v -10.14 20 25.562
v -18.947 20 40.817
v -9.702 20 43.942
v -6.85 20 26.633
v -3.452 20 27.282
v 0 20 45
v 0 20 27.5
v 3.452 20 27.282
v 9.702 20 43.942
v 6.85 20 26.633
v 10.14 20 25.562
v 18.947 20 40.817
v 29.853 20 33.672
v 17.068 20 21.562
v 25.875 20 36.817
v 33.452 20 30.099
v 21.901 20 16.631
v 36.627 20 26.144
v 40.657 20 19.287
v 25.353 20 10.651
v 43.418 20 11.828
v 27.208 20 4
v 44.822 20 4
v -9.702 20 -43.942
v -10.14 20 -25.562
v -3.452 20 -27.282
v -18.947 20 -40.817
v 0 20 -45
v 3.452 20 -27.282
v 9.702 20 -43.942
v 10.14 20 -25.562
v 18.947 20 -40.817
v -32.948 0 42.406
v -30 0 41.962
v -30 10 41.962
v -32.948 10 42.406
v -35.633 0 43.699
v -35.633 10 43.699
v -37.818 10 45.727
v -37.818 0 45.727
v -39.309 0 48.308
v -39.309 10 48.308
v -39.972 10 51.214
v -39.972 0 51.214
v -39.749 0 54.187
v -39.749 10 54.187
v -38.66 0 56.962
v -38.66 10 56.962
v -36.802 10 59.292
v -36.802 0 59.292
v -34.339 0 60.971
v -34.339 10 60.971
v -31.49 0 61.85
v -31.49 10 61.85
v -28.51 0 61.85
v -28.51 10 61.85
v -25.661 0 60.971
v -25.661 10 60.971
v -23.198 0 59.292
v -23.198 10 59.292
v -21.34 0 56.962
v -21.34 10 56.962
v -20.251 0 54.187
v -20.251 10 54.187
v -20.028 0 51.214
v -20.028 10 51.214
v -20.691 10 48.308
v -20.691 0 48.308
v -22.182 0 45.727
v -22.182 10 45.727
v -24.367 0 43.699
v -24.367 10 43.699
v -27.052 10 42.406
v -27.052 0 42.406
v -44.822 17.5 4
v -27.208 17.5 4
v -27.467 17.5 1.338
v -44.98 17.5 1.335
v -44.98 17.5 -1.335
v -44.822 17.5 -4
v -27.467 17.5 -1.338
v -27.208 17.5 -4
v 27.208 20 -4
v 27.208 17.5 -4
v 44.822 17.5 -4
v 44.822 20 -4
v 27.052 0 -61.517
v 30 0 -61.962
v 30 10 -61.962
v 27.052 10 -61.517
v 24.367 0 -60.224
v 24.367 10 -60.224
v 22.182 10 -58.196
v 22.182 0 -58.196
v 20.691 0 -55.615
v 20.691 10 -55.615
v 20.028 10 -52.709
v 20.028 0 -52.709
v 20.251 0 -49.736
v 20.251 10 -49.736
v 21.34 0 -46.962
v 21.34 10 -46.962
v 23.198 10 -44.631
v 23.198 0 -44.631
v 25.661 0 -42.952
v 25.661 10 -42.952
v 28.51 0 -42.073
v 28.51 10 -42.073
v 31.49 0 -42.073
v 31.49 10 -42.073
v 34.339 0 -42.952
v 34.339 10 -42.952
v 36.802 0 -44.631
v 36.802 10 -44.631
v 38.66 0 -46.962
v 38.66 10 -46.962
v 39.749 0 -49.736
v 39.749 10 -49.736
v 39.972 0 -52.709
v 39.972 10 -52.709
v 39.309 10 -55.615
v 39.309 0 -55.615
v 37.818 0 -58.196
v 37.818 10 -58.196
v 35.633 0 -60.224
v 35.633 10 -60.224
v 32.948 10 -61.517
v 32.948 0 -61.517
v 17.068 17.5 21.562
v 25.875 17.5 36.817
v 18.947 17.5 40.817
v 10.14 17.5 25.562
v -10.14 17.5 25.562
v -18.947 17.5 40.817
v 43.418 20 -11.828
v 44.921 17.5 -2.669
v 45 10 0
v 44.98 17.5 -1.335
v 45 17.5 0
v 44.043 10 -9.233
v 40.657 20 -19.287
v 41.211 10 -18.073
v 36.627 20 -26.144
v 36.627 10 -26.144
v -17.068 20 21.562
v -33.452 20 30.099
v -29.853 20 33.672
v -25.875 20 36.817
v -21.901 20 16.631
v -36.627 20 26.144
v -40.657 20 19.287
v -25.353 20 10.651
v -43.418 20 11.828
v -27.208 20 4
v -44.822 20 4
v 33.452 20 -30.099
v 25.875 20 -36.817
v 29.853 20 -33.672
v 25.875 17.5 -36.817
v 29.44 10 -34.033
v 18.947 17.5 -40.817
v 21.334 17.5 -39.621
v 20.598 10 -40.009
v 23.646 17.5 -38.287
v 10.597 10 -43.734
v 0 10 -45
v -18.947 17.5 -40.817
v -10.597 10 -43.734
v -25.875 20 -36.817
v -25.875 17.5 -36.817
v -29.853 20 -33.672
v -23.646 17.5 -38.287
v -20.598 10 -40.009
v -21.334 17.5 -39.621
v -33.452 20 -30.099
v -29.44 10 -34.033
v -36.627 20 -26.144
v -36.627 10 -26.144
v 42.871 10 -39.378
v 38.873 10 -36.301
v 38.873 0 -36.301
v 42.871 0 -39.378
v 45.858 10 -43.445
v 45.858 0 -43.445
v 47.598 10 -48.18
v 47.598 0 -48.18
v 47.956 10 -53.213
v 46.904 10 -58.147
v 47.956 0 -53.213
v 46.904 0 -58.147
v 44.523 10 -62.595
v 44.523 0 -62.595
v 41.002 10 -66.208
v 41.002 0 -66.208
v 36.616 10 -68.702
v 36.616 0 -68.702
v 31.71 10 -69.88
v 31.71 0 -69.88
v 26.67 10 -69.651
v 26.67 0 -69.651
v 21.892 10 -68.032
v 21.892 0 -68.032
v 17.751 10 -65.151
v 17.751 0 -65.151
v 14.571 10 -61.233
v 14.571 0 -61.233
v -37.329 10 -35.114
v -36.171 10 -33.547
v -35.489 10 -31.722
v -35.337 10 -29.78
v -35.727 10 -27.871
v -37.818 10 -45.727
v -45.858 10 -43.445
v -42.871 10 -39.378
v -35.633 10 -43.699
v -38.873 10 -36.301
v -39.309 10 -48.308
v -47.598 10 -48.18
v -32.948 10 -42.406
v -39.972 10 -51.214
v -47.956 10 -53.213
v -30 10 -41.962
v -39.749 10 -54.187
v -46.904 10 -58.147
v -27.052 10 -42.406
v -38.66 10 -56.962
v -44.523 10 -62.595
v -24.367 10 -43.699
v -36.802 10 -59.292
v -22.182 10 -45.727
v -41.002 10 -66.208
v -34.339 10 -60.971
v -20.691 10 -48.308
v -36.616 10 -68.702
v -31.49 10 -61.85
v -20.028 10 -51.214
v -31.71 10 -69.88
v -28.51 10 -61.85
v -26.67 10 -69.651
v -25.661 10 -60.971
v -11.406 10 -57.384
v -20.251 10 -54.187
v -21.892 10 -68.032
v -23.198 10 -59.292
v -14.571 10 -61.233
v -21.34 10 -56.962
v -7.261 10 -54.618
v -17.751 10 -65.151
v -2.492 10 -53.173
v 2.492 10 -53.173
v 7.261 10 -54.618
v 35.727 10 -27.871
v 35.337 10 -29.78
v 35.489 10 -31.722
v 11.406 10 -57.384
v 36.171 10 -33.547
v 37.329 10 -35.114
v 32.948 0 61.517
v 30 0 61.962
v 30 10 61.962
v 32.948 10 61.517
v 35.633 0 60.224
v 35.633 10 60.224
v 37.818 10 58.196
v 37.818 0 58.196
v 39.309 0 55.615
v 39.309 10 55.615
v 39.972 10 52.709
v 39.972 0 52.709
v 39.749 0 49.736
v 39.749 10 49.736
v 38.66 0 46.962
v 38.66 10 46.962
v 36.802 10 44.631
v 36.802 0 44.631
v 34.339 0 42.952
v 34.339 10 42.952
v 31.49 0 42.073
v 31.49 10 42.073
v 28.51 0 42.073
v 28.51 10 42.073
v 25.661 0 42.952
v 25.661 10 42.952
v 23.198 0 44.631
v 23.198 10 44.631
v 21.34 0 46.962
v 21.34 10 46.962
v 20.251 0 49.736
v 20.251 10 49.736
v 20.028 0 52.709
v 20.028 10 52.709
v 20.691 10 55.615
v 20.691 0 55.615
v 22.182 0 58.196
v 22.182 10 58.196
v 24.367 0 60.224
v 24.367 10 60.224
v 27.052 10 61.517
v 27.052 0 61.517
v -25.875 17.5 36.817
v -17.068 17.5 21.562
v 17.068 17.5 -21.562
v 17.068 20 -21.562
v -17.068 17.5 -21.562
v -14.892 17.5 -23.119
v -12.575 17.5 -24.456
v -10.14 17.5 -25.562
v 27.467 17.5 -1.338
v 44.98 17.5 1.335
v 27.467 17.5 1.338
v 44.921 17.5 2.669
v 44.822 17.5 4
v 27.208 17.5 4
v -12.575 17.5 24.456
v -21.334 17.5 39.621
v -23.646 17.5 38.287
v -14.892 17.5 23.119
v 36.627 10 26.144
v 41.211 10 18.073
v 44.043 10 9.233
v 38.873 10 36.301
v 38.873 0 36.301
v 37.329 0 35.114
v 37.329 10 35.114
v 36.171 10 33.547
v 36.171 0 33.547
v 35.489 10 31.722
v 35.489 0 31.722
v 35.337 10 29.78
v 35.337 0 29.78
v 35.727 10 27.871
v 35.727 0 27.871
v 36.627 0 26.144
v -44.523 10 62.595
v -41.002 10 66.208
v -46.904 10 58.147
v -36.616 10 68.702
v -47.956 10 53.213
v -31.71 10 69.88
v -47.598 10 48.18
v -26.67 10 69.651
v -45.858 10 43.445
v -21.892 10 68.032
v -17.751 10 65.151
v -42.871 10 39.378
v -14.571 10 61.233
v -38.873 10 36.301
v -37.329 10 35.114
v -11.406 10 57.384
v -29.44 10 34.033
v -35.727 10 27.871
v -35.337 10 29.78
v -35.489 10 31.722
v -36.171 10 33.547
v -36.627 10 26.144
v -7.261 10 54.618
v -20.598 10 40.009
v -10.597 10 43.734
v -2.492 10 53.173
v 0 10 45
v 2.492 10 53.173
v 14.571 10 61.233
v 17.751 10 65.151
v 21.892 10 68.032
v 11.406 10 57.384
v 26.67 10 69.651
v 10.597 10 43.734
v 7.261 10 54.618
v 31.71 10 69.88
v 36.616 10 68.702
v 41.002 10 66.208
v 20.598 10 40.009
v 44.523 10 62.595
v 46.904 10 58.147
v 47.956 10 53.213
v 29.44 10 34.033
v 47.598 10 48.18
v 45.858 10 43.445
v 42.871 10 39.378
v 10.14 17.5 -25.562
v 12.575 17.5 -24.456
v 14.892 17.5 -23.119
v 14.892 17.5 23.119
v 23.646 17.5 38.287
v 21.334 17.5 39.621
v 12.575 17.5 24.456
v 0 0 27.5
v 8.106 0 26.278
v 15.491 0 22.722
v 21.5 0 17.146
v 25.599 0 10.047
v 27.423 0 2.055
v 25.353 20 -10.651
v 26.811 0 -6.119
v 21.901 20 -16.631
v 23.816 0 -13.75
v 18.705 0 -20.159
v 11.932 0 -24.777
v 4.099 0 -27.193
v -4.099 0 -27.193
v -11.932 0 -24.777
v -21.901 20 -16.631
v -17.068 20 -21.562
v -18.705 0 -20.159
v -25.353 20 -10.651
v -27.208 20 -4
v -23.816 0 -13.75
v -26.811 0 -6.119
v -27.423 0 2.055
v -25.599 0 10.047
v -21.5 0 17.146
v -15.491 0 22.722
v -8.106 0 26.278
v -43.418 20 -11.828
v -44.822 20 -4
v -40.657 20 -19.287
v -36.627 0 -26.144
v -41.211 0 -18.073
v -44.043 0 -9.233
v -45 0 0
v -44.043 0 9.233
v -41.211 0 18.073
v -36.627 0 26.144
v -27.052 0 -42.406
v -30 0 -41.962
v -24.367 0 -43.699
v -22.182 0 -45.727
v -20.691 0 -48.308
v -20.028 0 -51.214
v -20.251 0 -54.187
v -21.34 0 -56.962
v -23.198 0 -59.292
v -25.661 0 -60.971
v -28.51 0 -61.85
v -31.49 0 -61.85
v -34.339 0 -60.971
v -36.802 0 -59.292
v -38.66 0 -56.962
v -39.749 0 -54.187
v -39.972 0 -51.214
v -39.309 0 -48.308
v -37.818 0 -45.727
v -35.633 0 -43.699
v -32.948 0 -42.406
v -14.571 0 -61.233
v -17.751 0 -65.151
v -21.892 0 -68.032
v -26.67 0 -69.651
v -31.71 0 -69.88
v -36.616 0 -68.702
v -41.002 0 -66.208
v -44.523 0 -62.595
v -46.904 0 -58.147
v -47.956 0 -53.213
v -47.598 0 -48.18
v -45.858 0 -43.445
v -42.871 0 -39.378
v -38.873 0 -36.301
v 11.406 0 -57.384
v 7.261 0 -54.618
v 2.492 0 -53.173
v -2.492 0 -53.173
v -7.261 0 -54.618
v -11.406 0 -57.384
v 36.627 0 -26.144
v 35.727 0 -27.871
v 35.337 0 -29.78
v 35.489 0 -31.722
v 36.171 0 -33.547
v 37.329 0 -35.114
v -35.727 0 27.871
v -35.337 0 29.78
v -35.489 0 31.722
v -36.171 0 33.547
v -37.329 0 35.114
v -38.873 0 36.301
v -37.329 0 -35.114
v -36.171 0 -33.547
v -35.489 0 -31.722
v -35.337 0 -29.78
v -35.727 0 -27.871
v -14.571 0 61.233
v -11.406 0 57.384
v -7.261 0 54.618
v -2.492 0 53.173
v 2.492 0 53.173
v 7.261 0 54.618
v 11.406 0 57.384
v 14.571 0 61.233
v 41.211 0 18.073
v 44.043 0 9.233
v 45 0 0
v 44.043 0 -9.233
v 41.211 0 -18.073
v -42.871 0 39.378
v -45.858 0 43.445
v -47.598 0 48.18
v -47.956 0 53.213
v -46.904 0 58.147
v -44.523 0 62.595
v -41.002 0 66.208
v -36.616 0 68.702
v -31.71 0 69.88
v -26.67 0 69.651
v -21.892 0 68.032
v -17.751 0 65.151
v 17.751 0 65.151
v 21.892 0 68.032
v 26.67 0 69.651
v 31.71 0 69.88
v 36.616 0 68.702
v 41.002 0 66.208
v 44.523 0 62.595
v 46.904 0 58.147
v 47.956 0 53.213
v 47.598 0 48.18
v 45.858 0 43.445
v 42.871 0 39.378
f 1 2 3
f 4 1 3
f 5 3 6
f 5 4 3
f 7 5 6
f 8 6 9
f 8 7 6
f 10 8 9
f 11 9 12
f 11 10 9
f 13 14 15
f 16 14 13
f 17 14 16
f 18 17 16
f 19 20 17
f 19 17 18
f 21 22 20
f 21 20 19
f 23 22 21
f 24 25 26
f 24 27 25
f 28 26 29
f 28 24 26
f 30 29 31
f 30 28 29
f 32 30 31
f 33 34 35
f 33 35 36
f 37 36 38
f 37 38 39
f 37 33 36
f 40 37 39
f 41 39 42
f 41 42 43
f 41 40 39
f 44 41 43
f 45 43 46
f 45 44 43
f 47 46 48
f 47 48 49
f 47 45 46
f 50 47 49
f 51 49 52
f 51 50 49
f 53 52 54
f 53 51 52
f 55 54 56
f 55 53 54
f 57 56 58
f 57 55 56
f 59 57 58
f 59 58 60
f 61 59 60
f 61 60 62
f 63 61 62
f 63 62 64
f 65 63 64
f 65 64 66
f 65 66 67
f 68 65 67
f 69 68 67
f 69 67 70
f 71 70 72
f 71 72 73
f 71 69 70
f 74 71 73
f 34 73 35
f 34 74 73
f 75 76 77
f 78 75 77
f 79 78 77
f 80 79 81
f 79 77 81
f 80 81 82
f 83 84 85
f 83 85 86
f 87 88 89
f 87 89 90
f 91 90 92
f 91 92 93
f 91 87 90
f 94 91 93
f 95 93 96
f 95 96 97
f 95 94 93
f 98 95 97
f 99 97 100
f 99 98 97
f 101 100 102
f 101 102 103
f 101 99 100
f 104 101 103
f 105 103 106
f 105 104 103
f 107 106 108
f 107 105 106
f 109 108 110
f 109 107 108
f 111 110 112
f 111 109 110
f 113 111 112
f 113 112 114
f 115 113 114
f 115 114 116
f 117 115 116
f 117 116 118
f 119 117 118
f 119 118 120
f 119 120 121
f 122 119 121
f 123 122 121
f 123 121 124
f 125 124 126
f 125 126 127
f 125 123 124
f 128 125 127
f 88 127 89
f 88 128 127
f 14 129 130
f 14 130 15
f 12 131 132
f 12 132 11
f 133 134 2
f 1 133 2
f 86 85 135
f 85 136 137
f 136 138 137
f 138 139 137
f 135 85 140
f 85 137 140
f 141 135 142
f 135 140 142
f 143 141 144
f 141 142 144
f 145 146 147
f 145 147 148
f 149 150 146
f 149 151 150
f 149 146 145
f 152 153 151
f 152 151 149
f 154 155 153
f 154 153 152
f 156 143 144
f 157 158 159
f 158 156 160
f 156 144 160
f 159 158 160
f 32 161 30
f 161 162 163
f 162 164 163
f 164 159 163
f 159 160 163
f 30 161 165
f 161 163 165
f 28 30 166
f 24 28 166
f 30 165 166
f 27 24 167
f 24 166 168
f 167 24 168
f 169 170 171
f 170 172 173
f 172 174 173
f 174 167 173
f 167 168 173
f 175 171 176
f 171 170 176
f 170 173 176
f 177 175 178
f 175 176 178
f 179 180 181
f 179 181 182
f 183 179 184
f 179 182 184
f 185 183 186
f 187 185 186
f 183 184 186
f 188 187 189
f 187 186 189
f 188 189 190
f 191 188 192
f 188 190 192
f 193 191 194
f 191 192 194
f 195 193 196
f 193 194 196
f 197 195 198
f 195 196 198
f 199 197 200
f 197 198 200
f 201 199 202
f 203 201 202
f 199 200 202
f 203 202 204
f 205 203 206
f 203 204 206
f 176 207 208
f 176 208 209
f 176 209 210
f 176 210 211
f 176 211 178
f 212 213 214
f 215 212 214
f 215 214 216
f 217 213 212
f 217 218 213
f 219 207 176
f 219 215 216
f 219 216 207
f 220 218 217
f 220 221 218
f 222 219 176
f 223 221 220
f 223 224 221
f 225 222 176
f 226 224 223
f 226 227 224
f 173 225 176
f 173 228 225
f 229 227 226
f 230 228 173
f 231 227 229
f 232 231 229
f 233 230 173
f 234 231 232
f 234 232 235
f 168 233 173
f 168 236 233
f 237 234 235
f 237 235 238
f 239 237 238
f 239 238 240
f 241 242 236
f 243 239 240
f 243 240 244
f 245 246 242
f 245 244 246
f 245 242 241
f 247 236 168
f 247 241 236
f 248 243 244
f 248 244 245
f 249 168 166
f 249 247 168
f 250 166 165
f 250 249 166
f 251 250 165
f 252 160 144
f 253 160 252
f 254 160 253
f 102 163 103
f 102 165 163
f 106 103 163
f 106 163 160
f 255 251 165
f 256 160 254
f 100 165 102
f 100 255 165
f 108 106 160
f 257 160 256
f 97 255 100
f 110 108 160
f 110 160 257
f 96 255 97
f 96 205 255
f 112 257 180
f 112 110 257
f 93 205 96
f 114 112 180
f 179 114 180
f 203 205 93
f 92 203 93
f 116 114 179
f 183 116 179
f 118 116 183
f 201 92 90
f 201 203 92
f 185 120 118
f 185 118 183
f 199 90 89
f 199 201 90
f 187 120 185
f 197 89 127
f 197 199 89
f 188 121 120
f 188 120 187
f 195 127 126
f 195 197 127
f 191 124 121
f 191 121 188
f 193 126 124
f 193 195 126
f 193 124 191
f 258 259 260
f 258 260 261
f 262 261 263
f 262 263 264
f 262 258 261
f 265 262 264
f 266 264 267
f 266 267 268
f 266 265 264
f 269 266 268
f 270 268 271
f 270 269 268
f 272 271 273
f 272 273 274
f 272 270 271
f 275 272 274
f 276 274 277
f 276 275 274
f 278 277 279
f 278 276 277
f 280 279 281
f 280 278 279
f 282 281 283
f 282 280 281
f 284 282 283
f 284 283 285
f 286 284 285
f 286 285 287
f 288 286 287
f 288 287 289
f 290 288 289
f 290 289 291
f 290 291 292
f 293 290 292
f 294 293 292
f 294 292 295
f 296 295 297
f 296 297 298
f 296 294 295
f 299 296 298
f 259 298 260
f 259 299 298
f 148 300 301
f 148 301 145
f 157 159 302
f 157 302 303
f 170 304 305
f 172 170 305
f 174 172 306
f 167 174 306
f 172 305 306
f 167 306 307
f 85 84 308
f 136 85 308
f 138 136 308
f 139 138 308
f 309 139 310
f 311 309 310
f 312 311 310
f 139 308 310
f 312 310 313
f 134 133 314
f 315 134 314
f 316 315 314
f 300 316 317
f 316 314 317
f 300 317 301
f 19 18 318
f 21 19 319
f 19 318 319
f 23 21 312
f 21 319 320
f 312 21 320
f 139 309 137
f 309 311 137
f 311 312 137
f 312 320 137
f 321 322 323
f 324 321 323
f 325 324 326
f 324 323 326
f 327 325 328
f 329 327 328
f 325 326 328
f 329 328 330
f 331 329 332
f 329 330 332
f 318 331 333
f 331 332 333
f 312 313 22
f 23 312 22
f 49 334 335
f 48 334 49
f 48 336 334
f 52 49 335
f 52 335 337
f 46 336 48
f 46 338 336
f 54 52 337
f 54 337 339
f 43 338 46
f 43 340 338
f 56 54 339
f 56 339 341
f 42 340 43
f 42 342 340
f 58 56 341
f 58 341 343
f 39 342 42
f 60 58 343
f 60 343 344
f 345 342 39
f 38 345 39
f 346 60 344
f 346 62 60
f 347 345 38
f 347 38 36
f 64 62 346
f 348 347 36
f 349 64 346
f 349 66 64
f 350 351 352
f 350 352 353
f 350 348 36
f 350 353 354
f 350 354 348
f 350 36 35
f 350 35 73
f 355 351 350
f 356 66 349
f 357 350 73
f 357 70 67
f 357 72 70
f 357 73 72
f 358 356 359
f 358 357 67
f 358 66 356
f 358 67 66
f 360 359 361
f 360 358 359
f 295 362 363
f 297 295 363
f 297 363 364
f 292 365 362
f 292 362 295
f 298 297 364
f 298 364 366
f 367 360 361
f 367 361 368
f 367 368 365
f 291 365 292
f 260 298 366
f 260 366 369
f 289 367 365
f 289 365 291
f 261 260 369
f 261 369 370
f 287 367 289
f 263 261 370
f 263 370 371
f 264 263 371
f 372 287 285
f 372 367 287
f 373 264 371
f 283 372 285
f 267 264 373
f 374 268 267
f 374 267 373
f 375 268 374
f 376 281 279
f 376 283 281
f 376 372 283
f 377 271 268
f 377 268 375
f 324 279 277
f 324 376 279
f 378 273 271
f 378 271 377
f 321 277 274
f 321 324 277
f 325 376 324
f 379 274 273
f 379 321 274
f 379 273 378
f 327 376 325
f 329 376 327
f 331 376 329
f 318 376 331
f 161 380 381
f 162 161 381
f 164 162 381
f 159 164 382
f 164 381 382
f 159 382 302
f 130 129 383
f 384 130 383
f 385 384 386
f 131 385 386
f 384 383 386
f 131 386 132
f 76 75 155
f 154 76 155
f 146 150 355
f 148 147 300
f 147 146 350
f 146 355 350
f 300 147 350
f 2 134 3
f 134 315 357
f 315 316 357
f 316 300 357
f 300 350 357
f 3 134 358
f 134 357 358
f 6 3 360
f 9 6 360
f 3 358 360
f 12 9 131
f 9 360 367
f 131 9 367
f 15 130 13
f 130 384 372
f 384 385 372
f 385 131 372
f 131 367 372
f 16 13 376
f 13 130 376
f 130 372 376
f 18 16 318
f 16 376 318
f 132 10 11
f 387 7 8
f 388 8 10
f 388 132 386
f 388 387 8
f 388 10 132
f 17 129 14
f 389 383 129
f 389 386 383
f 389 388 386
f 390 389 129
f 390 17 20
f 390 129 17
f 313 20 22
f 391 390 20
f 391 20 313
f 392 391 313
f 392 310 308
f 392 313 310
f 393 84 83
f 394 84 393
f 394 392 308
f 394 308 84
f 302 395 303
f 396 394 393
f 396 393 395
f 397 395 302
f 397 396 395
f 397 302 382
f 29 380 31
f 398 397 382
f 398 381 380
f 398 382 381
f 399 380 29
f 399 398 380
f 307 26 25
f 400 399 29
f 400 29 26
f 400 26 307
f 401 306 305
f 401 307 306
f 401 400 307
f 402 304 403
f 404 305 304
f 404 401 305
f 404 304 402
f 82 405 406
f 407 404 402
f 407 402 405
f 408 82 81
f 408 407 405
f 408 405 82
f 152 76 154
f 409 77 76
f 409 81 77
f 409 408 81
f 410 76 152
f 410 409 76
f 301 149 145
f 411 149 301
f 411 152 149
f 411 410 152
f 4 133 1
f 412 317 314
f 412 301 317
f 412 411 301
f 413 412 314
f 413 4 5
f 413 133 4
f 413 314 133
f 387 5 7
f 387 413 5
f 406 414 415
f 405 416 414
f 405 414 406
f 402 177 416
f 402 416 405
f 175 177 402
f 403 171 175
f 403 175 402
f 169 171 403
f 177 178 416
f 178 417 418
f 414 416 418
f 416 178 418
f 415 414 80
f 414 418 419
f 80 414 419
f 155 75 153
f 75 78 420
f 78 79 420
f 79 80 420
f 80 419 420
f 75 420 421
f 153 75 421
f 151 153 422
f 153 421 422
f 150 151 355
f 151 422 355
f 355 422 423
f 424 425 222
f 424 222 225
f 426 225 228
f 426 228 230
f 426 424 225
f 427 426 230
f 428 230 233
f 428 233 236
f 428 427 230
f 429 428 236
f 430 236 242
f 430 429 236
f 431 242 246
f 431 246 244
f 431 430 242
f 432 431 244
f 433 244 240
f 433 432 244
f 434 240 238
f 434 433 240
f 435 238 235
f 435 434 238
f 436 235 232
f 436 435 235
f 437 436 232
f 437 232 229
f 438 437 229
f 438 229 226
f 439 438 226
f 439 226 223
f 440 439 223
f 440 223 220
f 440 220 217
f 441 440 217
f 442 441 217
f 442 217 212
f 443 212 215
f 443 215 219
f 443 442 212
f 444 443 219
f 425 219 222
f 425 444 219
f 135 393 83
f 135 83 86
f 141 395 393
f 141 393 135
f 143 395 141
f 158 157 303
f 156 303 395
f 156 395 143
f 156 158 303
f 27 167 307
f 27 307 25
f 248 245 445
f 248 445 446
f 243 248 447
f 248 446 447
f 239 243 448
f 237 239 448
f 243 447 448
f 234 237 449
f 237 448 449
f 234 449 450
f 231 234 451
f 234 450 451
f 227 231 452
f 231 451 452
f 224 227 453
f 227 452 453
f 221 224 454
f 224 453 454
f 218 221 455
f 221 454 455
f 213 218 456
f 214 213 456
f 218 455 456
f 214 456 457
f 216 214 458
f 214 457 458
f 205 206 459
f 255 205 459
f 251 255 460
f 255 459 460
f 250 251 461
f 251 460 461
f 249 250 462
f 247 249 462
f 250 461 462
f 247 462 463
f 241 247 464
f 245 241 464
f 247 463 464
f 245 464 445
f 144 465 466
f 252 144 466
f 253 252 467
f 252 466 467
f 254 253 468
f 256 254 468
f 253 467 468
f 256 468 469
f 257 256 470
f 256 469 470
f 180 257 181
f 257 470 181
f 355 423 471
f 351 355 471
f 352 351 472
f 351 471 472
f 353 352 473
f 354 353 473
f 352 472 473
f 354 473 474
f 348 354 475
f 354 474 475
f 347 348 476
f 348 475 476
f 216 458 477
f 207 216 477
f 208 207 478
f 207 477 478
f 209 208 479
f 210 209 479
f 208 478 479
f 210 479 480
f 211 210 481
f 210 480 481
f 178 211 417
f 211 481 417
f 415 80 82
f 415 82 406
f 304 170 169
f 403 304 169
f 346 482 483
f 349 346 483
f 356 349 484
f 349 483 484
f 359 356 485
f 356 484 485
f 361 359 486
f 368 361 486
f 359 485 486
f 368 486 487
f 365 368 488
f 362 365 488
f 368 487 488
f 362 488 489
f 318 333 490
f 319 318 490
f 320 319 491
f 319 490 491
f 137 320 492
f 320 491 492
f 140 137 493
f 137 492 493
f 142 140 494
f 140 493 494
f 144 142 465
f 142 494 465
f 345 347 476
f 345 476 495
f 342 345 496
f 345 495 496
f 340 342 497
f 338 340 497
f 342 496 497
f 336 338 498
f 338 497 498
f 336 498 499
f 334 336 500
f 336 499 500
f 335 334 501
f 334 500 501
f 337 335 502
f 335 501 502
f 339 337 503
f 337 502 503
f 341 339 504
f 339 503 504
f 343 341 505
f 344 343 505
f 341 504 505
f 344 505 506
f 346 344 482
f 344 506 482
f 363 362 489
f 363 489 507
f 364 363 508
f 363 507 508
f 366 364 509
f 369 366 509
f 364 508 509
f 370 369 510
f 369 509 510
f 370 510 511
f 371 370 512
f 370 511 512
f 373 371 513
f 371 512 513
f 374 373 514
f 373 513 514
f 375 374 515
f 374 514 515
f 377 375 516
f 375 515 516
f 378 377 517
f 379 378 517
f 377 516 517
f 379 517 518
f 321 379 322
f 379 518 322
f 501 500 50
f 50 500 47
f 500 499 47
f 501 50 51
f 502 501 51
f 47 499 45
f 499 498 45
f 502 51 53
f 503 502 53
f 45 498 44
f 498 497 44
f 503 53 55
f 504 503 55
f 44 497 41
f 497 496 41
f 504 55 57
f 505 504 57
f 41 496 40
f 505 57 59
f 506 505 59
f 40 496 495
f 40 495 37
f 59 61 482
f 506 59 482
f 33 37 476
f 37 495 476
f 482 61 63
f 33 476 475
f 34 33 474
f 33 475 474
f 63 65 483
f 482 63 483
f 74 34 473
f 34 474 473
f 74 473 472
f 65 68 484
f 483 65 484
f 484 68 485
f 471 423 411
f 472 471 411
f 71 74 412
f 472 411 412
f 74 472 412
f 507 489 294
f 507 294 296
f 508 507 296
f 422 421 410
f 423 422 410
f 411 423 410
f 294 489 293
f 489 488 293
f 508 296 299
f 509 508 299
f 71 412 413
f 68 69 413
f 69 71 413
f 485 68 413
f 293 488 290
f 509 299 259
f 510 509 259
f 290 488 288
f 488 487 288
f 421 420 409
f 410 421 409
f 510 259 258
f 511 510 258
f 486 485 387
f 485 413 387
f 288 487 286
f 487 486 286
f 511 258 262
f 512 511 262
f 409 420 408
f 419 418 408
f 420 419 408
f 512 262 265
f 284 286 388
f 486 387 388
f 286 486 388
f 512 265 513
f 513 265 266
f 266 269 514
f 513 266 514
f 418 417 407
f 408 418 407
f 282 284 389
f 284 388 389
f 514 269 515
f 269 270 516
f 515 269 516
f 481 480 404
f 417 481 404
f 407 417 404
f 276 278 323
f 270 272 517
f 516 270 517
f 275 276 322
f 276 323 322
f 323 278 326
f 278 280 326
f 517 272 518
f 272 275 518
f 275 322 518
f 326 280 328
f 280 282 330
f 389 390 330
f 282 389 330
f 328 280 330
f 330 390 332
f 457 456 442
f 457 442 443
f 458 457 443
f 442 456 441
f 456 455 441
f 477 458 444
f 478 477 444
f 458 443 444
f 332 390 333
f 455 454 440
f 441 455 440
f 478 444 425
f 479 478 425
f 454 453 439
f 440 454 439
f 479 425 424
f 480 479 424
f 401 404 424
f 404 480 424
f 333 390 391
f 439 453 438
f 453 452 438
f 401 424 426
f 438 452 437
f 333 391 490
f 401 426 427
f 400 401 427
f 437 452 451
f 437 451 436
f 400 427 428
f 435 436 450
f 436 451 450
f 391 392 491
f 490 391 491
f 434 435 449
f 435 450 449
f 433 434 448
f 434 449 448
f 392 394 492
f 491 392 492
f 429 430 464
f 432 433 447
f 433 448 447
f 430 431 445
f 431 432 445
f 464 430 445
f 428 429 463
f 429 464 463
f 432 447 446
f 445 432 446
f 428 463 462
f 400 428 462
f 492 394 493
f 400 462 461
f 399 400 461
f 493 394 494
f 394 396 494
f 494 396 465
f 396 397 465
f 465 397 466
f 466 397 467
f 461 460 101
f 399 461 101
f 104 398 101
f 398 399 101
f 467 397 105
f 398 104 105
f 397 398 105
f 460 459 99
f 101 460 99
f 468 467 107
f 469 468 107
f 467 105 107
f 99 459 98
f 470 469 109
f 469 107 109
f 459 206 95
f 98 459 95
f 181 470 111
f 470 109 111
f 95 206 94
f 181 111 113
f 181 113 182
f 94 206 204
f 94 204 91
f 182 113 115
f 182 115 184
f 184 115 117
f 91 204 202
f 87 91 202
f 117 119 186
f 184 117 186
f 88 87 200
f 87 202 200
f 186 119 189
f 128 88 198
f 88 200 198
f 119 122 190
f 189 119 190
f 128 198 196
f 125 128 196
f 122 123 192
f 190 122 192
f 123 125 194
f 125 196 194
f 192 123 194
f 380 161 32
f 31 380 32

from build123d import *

# Parameters (mm, degrees)
SKETCH_1_R               = 27.5
SKETCH_1_R_2             = 10
EXTRUDE_1_DEPTH          = 10
SKETCH_2_R               = 27.5
EXTRUDE_2_DEPTH          = 10
SKETCH_3_W               = 8
SKETCH_3_H               = 2.5
CUT_EXTRUDE_2_DEPTH      = 108
PATTERN_CIRCULAR_2_COUNT = 6


with BuildPart() as part:
    # Эскиз1 → Бобышка-Вытянуть1 (new body)
    with BuildSketch(Plane(origin=(0, 0, 0), x_dir=(1, 0, 0), z_dir=(0, 1, 0))):
        with BuildLine():
            ThreePointArc((36.626693786, -26.14355183), (45, 0), (36.626693786, 26.14355183))
            ThreePointArc((36.626693786, 26.14355183), (35.489388485, 31.722157226), (38.87340923, 36.300661906))
            ThreePointArc((38.87340923, 36.300661906), (42.889809267, 64.52547333), (14.571428571, 61.232941793))
            ThreePointArc((14.571428571, 61.232941793), (0, 52.989280604), (-14.571428571, 61.232941793))
            ThreePointArc((-14.571428571, 61.232941793), (-42.889809267, 64.52547333), (-38.87340923, 36.300661906))
            ThreePointArc((-38.87340923, 36.300661906), (-35.489388485, 31.722157226), (-36.626693786, 26.14355183))
            ThreePointArc((-36.626693786, 26.14355183), (-45, 0), (-36.626693786, -26.14355183))
            ThreePointArc((-36.626693786, -26.14355183), (-35.489388485, -31.722157226), (-38.87340923, -36.300661906))
            ThreePointArc((-38.87340923, -36.300661906), (-42.889809267, -64.52547333), (-14.571428571, -61.232941793))
            ThreePointArc((-14.571428571, -61.232941793), (0, -52.989280604), (14.571428571, -61.232941793))
            ThreePointArc((14.571428571, -61.232941793), (42.889809267, -64.52547333), (38.87340923, -36.300661906))
            ThreePointArc((38.87340923, -36.300661906), (35.489388485, -31.722157226), (36.626693786, -26.14355183))
        make_face()
        Circle(SKETCH_1_R, mode=Mode.SUBTRACT)
        with Locations((30, -51.961524227)):
            Circle(SKETCH_1_R_2, mode=Mode.SUBTRACT)
        with Locations((-30, -51.961524227)):
            Circle(SKETCH_1_R_2, mode=Mode.SUBTRACT)
        with Locations((-30, 51.961524227)):
            Circle(SKETCH_1_R_2, mode=Mode.SUBTRACT)
        with Locations((30, 51.961524227)):
            Circle(SKETCH_1_R_2, mode=Mode.SUBTRACT)
    extrude(amount=EXTRUDE_1_DEPTH)

    # Эскиз2 → Бобышка-Вытянуть2 (add)
    with BuildSketch(Plane(origin=(0, 10, 0), x_dir=(1, 0, 0), z_dir=(0, 1, 0))):
        with BuildLine():
            ThreePointArc((36.626693786, 26.14355183), (0, 45), (-36.626693786, 26.14355183))
            ThreePointArc((-36.626693786, 26.14355183), (-45, 0), (-36.626693786, -26.14355183))
            ThreePointArc((-36.626693786, -26.14355183), (0, -45), (36.626693786, -26.14355183))
            ThreePointArc((36.626693786, -26.14355183), (42.855578519, -13.725865722), (45, 0))
            ThreePointArc((45, 0), (42.855578519, 13.725865722), (36.626693786, 26.14355183))
        make_face()
        Circle(SKETCH_2_R, mode=Mode.SUBTRACT)
    extrude(amount=EXTRUDE_2_DEPTH)

    # Эскиз3 → Вырез-Вытянуть2 (cut)
    with BuildSketch(Plane(origin=(0, 0, 0), x_dir=(0, 0, -1), z_dir=(1, 0, 0))):
        with Locations((0, 18.75)):
            Rectangle(SKETCH_3_W, SKETCH_3_H)
    cut_extrude_2 = extrude(amount=-CUT_EXTRUDE_2_DEPTH, mode=Mode.SUBTRACT)

    # Круговой массив2: Вырез-Вытянуть2 ×6 about axis
    pattern_circular_2_axis = Axis((0, -50, 0), (0, 1, 0))
    for i in range(1, PATTERN_CIRCULAR_2_COUNT):
        add(cut_extrude_2.rotate(pattern_circular_2_axis, i * 360 / PATTERN_CIRCULAR_2_COUNT), mode=Mode.SUBTRACT)


solid = part.part
